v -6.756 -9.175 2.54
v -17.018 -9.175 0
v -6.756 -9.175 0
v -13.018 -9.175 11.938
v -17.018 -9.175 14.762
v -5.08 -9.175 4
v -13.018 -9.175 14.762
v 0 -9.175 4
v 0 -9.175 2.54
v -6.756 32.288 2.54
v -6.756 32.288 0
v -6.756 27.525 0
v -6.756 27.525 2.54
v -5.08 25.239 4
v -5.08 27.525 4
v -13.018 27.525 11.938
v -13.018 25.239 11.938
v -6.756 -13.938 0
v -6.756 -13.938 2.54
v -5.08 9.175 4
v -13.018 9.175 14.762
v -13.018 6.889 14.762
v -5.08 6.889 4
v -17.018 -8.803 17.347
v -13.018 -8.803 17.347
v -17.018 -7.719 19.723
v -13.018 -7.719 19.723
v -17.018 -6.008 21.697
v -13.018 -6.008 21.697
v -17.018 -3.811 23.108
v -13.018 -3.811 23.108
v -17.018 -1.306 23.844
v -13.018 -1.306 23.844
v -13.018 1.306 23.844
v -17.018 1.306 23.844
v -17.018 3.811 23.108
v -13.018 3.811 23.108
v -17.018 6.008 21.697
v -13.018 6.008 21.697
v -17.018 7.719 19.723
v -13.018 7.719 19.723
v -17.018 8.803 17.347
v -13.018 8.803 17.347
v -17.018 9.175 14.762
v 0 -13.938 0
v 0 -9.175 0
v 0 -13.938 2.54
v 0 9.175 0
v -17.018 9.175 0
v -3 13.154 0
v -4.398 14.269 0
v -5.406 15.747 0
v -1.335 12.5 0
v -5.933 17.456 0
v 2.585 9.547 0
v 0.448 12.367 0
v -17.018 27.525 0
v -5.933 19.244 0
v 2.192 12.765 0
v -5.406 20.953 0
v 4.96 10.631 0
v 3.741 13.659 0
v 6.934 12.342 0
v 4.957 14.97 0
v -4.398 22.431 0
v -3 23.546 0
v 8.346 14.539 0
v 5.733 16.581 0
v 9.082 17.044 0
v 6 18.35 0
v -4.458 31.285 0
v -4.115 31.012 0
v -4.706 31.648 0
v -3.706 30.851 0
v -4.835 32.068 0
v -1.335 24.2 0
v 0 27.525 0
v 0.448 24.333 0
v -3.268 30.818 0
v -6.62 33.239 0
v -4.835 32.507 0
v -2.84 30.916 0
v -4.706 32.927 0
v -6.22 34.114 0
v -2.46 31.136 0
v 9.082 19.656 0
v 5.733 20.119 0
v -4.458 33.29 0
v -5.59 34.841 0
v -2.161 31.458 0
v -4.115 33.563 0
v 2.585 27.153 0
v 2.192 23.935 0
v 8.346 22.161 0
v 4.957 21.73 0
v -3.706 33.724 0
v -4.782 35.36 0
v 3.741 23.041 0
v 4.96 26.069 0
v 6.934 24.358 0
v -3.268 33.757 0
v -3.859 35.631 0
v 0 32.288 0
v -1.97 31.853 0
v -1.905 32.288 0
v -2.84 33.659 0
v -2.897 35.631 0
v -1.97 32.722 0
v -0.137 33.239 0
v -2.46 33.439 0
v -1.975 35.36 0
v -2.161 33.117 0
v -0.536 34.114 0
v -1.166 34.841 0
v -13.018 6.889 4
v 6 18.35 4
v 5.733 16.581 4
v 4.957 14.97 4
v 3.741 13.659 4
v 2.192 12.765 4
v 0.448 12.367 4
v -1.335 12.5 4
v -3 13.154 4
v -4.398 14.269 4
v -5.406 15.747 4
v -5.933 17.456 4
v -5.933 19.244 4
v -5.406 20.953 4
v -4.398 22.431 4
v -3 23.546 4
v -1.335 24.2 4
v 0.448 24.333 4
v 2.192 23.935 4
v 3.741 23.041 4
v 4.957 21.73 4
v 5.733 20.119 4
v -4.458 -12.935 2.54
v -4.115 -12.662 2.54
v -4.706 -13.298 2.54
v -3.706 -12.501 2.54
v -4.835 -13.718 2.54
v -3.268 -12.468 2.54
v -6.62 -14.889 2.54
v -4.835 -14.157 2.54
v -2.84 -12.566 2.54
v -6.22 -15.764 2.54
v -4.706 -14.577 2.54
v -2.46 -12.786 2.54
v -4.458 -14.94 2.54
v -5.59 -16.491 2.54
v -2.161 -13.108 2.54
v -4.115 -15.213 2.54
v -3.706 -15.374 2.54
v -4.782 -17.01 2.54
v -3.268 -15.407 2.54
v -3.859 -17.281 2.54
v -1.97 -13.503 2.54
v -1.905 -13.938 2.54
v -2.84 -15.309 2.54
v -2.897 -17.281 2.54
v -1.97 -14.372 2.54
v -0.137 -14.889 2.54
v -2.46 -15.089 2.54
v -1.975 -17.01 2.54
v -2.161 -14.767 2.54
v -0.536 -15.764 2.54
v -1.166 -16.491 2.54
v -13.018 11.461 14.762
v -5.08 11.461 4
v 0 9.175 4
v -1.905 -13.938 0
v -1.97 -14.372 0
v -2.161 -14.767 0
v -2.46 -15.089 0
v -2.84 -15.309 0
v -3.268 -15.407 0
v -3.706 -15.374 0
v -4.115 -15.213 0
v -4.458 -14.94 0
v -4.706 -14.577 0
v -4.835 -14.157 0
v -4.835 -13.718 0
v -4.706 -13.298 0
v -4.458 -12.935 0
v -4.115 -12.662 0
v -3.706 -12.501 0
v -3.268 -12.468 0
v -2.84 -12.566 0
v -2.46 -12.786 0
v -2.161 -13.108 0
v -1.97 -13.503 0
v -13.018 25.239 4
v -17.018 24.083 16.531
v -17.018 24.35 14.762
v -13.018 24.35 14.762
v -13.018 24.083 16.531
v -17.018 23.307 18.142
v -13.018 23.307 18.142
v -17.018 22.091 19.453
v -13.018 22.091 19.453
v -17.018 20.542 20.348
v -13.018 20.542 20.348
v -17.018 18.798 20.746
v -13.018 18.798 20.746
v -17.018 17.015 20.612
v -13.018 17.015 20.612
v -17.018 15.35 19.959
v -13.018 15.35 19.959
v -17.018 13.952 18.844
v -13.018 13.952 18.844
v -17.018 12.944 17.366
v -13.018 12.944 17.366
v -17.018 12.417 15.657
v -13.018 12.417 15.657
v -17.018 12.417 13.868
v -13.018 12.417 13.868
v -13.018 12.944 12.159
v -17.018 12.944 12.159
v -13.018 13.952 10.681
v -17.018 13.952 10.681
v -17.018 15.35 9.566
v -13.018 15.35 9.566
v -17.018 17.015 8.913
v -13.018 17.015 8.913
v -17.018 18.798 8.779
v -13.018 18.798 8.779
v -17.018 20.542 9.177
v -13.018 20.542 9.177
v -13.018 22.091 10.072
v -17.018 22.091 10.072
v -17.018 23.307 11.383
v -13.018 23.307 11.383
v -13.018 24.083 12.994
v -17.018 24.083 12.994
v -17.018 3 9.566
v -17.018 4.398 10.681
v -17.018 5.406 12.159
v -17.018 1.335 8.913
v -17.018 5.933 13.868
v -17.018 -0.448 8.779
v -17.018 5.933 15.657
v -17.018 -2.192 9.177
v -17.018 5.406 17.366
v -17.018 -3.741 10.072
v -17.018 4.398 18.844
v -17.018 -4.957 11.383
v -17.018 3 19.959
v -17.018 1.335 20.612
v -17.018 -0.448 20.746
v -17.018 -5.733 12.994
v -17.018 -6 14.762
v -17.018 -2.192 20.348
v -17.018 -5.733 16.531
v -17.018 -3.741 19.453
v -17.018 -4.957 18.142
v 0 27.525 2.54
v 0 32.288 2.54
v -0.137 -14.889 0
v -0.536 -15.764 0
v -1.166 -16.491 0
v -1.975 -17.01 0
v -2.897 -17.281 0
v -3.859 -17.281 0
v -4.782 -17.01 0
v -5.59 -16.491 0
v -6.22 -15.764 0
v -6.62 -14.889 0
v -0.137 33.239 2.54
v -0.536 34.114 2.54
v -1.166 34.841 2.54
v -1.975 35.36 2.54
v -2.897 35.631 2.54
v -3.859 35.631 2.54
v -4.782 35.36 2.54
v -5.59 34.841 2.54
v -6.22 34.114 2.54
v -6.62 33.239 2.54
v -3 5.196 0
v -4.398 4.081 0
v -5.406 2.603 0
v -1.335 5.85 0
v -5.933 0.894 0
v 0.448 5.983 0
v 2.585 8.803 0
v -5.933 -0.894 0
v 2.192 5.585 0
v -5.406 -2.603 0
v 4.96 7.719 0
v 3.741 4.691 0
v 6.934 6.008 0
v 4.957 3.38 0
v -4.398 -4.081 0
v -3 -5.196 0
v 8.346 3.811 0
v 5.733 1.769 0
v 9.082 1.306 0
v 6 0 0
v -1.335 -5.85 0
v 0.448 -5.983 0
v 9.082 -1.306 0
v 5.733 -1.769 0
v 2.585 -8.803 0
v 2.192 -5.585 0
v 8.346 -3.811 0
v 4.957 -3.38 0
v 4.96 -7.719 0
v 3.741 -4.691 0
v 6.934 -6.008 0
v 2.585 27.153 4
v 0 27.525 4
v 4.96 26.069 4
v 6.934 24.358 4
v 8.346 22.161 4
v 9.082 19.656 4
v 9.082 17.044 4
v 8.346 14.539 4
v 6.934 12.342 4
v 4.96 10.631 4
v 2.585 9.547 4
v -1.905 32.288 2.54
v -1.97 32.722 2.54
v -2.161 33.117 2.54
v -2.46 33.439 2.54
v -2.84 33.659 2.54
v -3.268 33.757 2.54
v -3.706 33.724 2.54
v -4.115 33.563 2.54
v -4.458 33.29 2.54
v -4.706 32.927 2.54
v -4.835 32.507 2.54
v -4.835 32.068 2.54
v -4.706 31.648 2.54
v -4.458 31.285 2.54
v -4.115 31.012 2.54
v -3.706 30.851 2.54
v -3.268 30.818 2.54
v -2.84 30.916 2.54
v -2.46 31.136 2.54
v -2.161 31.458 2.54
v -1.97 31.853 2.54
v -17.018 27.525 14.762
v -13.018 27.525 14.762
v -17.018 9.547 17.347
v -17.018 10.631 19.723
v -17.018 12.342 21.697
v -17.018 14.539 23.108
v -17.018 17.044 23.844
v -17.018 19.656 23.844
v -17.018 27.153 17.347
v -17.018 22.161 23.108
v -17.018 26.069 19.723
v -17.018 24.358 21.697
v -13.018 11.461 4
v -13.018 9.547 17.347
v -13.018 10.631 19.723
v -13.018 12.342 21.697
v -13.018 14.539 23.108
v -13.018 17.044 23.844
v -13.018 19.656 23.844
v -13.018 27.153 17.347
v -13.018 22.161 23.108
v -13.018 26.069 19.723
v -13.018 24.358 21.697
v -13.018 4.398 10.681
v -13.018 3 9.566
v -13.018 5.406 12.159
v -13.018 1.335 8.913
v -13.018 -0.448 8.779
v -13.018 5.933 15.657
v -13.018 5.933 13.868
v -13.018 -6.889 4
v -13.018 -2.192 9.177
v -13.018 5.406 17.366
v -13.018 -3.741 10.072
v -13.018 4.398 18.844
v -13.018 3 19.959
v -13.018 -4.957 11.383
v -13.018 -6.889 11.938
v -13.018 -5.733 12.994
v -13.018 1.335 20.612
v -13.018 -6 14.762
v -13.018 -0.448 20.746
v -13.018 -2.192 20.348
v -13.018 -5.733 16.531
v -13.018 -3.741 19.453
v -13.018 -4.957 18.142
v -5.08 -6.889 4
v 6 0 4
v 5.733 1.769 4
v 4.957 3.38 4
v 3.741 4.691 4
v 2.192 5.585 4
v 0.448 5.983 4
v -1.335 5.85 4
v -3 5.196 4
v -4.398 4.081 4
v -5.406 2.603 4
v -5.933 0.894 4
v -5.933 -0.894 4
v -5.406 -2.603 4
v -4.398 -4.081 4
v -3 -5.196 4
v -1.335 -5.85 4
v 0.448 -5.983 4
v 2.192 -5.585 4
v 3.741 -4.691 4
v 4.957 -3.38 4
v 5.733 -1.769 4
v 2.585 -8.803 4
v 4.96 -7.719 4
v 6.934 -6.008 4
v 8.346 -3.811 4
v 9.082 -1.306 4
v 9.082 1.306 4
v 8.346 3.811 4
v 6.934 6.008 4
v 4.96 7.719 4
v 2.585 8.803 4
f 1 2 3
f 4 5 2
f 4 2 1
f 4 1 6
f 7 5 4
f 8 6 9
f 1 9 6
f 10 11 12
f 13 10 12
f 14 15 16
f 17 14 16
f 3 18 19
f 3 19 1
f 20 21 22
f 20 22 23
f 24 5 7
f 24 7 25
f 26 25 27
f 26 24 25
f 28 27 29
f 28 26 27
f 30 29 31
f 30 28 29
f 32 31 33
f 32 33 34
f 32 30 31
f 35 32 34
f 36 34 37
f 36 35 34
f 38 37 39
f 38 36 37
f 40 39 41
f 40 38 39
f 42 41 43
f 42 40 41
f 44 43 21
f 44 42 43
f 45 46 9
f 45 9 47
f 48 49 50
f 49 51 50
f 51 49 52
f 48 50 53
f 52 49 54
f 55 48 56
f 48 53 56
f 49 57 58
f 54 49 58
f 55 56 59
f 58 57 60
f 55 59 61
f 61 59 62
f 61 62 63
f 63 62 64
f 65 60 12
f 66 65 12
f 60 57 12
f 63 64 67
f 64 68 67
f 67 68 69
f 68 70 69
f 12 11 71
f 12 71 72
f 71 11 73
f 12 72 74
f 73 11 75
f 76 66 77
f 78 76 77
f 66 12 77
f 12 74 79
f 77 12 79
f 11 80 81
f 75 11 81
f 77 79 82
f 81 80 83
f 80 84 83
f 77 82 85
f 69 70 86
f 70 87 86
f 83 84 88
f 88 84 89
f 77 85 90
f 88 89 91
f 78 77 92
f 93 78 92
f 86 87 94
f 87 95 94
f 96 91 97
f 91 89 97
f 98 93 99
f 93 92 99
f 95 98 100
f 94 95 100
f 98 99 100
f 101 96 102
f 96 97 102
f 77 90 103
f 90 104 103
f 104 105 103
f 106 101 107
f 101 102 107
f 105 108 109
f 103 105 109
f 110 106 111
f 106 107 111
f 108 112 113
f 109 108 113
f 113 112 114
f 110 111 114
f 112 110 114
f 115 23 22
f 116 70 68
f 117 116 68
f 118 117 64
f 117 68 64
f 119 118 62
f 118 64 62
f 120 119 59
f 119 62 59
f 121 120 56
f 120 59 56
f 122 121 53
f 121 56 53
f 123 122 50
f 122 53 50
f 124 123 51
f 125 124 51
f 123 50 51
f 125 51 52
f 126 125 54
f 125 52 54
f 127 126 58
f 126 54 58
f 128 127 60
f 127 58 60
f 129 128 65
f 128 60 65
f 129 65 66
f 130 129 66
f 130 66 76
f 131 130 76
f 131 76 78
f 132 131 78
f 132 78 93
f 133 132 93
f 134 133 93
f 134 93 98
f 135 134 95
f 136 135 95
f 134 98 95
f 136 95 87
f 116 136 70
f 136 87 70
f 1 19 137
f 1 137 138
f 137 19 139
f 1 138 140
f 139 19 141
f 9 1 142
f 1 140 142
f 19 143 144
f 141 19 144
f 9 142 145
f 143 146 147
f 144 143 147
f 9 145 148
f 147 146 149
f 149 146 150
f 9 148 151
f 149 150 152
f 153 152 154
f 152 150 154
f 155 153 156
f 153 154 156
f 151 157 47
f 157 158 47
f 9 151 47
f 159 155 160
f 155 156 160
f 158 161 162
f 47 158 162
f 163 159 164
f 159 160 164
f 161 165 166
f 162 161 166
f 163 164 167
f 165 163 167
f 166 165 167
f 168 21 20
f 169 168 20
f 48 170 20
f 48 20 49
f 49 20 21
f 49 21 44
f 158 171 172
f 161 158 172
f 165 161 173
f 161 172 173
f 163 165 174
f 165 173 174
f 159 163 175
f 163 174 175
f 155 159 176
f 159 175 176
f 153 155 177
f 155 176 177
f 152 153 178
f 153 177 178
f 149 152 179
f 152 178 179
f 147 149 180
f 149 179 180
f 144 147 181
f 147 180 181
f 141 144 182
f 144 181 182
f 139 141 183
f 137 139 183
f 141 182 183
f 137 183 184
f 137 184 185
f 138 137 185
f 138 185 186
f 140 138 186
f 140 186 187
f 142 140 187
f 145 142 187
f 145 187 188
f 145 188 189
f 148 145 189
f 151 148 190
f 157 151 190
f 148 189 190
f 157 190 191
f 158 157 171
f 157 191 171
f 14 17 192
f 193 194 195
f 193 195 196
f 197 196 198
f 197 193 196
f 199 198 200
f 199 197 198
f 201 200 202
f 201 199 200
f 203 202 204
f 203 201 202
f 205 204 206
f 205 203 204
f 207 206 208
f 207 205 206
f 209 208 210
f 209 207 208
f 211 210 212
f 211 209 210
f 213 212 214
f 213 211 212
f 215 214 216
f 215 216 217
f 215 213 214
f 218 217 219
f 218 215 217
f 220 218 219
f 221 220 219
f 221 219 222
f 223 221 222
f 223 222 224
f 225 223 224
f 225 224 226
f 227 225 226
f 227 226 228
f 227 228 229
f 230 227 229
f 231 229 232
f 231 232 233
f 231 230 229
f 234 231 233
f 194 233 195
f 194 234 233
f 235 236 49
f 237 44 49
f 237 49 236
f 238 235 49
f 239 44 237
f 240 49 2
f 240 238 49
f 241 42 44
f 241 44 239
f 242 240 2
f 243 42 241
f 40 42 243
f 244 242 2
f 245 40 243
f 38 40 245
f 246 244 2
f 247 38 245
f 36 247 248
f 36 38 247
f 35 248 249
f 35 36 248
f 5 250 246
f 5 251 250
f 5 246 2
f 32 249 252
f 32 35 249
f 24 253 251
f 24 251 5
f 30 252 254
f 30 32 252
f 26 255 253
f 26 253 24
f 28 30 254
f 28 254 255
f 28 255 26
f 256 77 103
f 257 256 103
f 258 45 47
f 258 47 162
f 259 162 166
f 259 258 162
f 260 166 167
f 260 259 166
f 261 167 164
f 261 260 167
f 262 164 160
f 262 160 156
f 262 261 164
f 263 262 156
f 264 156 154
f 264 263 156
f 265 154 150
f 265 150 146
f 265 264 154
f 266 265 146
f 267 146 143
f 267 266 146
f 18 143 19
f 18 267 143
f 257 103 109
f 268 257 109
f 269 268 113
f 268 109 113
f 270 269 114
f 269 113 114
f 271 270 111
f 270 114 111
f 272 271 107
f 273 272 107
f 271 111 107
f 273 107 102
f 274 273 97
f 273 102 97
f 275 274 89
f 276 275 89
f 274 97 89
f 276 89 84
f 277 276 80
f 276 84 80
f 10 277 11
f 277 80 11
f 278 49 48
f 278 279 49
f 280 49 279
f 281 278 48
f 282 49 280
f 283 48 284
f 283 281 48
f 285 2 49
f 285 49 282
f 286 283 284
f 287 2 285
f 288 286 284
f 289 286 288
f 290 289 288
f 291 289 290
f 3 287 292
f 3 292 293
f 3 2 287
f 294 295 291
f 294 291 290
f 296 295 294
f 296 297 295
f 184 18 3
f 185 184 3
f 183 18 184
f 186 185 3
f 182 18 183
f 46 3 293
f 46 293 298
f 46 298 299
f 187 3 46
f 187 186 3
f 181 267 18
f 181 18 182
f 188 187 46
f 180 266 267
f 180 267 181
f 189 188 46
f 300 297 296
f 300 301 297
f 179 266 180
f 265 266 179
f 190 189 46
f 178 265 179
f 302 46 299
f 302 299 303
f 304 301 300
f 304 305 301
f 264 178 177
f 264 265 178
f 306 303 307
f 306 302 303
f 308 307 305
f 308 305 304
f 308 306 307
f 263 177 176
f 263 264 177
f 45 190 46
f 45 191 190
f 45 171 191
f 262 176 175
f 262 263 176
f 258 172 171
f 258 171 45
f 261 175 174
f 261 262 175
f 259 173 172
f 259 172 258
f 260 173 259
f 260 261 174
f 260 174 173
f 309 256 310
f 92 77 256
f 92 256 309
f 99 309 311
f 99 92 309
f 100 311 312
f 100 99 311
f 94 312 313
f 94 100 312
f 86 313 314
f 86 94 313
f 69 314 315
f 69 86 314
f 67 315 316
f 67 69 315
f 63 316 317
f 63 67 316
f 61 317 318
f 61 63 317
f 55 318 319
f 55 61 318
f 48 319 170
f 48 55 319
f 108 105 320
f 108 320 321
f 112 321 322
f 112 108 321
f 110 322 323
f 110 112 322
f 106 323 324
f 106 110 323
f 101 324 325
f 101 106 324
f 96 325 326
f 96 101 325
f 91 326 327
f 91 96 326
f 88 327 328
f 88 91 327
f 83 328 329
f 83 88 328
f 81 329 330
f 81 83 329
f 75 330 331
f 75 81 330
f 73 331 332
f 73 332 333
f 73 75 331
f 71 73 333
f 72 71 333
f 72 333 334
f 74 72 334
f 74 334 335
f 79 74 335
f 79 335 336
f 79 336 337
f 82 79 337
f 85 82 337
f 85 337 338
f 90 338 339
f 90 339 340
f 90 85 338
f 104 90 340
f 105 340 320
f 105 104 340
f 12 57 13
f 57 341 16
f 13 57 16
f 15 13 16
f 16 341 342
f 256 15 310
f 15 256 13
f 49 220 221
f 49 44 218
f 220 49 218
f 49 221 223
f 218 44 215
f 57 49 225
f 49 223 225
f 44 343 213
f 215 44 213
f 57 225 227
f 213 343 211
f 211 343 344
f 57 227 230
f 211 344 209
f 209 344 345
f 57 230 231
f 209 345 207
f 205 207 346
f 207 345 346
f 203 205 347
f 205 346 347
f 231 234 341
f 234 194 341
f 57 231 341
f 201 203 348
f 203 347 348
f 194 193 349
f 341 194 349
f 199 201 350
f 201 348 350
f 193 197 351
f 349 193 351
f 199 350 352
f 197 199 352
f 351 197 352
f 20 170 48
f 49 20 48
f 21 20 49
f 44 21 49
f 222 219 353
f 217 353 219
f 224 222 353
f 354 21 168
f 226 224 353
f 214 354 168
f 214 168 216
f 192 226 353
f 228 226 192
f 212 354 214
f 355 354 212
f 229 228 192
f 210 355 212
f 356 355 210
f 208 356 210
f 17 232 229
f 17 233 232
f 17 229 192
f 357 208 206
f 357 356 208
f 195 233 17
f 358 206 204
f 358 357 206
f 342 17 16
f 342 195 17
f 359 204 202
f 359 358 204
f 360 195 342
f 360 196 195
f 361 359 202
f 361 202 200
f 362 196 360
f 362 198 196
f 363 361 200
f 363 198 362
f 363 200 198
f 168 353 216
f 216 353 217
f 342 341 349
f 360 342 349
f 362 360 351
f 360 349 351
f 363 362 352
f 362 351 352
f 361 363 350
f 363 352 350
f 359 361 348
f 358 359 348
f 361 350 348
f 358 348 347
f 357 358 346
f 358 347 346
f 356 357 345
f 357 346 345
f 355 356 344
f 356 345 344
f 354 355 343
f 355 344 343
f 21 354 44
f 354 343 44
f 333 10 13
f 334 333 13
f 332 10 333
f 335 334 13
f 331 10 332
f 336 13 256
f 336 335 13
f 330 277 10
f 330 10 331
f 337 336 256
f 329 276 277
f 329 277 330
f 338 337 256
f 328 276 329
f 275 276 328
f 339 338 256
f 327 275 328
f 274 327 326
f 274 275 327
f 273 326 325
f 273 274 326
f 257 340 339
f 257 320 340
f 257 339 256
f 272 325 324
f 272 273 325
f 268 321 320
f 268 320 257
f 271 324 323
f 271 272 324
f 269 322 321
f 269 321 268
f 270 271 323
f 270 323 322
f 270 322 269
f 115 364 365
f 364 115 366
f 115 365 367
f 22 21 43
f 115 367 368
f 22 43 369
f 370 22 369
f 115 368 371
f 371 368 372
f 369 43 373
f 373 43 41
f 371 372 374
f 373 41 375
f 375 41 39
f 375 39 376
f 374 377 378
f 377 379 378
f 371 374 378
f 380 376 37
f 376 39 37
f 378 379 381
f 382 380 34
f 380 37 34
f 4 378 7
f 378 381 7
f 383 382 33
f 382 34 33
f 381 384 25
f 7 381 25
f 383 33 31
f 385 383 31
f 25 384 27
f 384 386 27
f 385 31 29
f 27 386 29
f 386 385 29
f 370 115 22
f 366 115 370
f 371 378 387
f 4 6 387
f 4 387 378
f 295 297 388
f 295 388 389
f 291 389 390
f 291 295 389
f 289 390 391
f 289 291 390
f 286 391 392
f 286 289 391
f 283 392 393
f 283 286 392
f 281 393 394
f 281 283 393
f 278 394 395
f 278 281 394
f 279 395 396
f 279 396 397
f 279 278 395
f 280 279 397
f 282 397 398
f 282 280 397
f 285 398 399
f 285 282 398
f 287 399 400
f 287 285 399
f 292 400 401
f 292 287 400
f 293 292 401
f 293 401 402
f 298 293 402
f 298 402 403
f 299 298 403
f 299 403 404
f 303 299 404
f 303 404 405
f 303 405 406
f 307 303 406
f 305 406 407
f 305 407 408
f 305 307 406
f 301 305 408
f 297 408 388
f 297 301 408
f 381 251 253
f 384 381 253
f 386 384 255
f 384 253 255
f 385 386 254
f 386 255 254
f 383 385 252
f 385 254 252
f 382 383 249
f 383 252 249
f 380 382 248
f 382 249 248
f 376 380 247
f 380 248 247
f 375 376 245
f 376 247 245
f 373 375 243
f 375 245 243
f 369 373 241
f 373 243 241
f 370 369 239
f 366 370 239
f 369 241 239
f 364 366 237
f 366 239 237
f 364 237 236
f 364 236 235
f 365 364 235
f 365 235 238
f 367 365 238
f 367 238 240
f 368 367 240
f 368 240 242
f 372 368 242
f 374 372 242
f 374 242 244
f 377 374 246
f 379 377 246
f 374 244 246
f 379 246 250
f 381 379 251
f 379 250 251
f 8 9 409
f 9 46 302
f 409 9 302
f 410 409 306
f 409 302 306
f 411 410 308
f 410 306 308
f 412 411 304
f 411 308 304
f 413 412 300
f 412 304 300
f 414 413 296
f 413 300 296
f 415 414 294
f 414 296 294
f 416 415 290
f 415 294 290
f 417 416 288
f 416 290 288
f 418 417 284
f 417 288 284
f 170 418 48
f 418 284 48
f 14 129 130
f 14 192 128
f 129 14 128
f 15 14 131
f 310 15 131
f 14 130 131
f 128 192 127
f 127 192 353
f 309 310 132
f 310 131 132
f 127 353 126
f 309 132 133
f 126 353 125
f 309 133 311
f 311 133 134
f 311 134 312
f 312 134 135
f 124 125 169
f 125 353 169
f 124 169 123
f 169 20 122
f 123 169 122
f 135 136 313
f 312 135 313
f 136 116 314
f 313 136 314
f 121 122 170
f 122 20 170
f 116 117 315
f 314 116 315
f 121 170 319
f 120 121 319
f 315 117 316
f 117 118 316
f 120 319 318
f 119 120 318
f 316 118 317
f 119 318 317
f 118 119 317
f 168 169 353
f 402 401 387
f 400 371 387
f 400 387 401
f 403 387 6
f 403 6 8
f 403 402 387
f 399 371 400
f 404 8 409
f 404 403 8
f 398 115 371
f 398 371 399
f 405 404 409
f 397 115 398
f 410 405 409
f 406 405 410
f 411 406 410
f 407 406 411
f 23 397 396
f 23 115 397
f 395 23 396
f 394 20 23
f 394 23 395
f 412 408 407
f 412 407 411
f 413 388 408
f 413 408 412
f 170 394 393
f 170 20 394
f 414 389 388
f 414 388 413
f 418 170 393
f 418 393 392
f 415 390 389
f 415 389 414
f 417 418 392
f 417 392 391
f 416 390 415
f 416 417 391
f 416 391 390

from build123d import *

# Parameters (mm, degrees)
F0_R     = 6
F1_DEPTH = 4
F2_R     = 6
F3_DEPTH = 4
F5_DEPTH = 2.286
F7_DEPTH = 2.286
F8_R     = 1.4732
F9_DEPTH = 2.54


with BuildPart() as f1:
    # F0 (on Top) → F1 (new body)
    with BuildSketch(Plane.XY):
        with BuildLine():
            ThreePointArc((0, -9.175), (9.175, 0), (0, 9.175))
            Line((0, 9.175), (-17.018, 9.175))
            Line((-17.018, 9.175), (-17.018, -9.175))
            Line((-17.018, -9.175), (0, -9.175))
        make_face()
        Circle(F0_R, mode=Mode.SUBTRACT)
    extrude(amount=F1_DEPTH)

    # F2 (on face) → F3 (join)
    with BuildSketch(Plane(origin=(-17.018, 0, 0), x_dir=(0, -1, 0), z_dir=(-1, 0, 0))):
        with BuildLine():
            ThreePointArc((9.175, 14.7625), (0, 23.9375), (-9.175, 14.7625))
            Line((-9.175, 14.7625), (-9.175, 4))
            Line((-9.175, 4), (9.175, 4))
            Line((9.175, 4), (9.175, 14.7625))
        make_face()
        with Locations((0, 14.7625)):
            Circle(F2_R, mode=Mode.SUBTRACT)
    extrude(amount=-F3_DEPTH)

    # F4 (on face) → F5 (join)
    with BuildSketch(Plane.XZ.offset(9.175)):
        Polygon((-5.0805, 4), (-13.018, 11.9375), (-13.018, 4), align=None)
    extrude(amount=-F5_DEPTH)

    # F6 (on face) → F7 (join)
    with BuildSketch(Plane(origin=(0, 9.175, 0), x_dir=(-1, 0, 0), z_dir=(0, 1, 0))):
        Polygon((13.018, 4), (13.018, 14.7625), (5.0805, 4), align=None)
    extrude(amount=-F7_DEPTH)

    # F8 (on face) → F9 (join)
    with BuildSketch(Plane(origin=(0, 0, 0), x_dir=(1, 0, 0), z_dir=(0, 0, -1))):
        with BuildLine():
            ThreePointArc((0, 13.9375), (-3.3782, 17.3157), (-6.7564, 13.9375))
            Line((-6.7564, 13.9375), (-6.7564, 9.175))
            Line((-6.7564, 9.175), (0, 9.175))
            Line((0, 9.175), (0, 13.9375))
        make_face()
        with Locations((-3.3782, 13.9375)):
            Circle(F8_R, mode=Mode.SUBTRACT)
    extrude(amount=-F9_DEPTH)


with BuildPart() as f10_1:
    # F10: instance of F1
    add(f1.part.mirror(Plane(origin=(-10.847828, 9.175, 5.617012), x_dir=(-1, 0, 0), z_dir=(0, 1, 0))))


solid = Compound([f1.part, f10_1.part])
